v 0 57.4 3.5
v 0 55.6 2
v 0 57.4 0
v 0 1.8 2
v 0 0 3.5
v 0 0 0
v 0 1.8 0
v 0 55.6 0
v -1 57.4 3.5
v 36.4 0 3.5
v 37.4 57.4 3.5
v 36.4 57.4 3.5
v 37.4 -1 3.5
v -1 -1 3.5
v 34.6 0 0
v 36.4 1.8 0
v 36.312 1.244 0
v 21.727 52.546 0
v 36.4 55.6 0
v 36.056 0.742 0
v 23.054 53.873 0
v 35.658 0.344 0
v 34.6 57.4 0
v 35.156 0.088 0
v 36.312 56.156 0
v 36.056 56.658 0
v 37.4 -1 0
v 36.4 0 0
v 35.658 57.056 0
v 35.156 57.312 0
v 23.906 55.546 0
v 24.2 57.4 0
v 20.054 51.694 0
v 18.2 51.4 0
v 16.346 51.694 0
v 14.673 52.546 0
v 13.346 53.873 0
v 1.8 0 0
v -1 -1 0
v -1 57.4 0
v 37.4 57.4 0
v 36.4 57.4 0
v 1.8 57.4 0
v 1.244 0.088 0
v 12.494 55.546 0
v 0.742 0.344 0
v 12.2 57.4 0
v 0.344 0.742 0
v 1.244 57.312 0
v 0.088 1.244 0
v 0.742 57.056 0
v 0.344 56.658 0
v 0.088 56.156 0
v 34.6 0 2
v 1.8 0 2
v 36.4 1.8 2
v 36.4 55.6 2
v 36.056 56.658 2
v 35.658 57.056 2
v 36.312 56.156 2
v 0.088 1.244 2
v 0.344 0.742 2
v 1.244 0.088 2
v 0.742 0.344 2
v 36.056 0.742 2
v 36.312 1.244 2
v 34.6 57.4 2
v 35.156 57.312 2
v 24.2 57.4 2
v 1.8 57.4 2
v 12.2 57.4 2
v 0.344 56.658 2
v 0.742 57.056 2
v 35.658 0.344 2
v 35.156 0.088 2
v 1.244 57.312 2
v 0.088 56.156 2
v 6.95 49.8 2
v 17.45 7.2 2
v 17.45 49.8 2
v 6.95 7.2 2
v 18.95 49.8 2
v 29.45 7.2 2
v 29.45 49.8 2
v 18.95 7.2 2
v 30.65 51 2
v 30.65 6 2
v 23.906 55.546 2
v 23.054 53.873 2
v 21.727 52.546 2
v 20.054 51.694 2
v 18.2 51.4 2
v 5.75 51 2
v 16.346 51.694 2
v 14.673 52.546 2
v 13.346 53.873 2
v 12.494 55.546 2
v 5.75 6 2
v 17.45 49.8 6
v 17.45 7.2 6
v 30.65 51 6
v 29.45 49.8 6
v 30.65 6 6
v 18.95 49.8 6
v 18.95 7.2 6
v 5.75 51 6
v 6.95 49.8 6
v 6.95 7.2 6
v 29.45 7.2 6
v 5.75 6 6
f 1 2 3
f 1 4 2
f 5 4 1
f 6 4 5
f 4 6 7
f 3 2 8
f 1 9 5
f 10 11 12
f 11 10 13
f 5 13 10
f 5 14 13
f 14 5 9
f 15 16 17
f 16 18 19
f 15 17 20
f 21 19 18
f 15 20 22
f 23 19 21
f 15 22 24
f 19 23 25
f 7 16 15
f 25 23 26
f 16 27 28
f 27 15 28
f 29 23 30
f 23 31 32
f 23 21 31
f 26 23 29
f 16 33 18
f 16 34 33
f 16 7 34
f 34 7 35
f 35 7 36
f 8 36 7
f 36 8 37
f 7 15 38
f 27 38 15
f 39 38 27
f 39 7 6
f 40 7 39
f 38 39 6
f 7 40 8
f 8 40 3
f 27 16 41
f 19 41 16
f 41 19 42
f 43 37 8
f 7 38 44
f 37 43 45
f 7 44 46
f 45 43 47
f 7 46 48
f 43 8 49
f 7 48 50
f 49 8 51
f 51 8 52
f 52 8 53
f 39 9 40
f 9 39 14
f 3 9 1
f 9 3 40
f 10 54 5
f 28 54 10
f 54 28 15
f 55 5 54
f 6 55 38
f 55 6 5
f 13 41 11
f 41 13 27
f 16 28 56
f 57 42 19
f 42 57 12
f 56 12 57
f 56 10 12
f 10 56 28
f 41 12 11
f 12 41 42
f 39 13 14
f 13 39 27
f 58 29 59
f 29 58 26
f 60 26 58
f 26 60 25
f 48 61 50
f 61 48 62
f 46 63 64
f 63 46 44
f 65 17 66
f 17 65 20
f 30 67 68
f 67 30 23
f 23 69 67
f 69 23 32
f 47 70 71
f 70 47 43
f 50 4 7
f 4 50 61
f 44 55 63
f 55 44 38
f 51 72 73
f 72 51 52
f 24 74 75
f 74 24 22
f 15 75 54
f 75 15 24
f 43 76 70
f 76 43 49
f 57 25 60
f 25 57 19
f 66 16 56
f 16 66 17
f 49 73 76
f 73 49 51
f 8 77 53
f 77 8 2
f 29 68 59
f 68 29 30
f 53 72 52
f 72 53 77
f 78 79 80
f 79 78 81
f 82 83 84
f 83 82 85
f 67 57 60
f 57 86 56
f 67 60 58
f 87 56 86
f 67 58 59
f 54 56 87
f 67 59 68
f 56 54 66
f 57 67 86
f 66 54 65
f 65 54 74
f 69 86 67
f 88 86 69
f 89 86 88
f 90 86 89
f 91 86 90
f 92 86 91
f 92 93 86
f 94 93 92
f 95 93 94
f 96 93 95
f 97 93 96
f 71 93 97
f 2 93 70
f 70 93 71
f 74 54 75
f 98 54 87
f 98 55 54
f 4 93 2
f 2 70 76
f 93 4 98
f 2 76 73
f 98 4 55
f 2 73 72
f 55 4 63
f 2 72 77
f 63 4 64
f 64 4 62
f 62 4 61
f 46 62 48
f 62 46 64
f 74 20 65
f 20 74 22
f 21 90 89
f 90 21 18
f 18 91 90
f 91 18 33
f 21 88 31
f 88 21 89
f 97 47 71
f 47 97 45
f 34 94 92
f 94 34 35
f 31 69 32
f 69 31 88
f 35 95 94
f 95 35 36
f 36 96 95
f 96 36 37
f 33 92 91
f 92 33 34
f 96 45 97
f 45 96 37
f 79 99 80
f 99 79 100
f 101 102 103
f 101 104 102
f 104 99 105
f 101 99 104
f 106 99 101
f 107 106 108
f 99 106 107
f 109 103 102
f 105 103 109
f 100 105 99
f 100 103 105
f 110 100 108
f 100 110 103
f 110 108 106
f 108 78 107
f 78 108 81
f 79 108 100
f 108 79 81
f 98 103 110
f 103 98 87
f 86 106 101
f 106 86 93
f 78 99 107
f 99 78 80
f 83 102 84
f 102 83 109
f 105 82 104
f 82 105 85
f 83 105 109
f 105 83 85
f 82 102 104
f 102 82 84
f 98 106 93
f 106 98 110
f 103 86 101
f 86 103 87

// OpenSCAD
// Pocket Gambler — Battery Door
// Sliding door for 2× AAA battery compartment
// Fits into the battery_door opening in the rear lid

// ═══════════════════════════════════════════════════
// PARAMETERS (must match lid.scad opening)
// ═══════════════════════════════════════════════════

door_w    = 36.4;   // slightly smaller than opening (0.6mm clearance per side)
door_h    = 57.4;   // slightly smaller than opening
door_t    = 2.0;    // door plate thickness
corner_r  = 1.8;

// Lip around 3 edges (holds door in opening, open 4th side for sliding)
lip_t     = 1.0;    // lip thickness (overlaps lid edge)
lip_h     = 1.5;    // how much lip wraps around lid thickness

// Thumb notch (half-circle cutout for opening)
notch_r   = 6;
notch_x   = door_w / 2;
notch_y   = door_h;   // at the open (sliding) edge

// AAA cell guides (internal ribs to hold batteries in place)
// 2× AAA in parallel orientation (side by side)
aaa_d      = 10.5;   // AAA cell diameter + 0.5mm clearance
aaa_len    = 45.0;   // AAA cell length + 1mm clearance
aaa_wall   = 1.2;    // rib wall thickness
aaa_sep    = 1.5;    // gap between cells
aaa_y_off  = 6;      // from bottom of door interior

// Total cell bay width = 2 × aaa_d + aaa_sep + 2 × aaa_wall
// Must fit within door_w
bay_w  = 2 * aaa_d + aaa_sep + 2 * aaa_wall;
bay_x  = (door_w - bay_w) / 2;


// ═══════════════════════════════════════════════════
// MODULES
// ═══════════════════════════════════════════════════

module rounded_plate(w, h, t, r) {
    hull() {
        translate([r, r, 0])       cylinder(r=r, h=t, $fn=20);
        translate([w-r, r, 0])     cylinder(r=r, h=t, $fn=20);
        translate([r, h-r, 0])     cylinder(r=r, h=t, $fn=20);
        translate([w-r, h-r, 0])   cylinder(r=r, h=t, $fn=20);
    }
}

module thumb_notch() {
    translate([notch_x, notch_y, -0.1])
        cylinder(r=notch_r, h=door_t + 0.2, $fn=20);
}

module edge_lips() {
    // Left lip
    translate([-lip_t, 0, 0])
        cube([lip_t, door_h, door_t + lip_h]);
    // Right lip
    translate([door_w, 0, 0])
        cube([lip_t, door_h, door_t + lip_h]);
    // Bottom lip (closed end)
    translate([-lip_t, -lip_t, 0])
        cube([door_w + 2*lip_t, lip_t, door_t + lip_h]);
    // Note: top edge (notch end) has no lip — this is the sliding direction
}

module aaa_cell_guides() {
    // Two parallel cradles for AAA cells
    guide_h = 4;  // height of rib wall above door floor

    // Left outer wall
    translate([bay_x, aaa_y_off, door_t])
        cube([aaa_wall, aaa_len, guide_h]);

    // Center divider
    translate([bay_x + aaa_wall + aaa_d, aaa_y_off, door_t])
        cube([aaa_sep, aaa_len, guide_h]);

    // Right outer wall
    translate([bay_x + aaa_wall + aaa_d + aaa_sep + aaa_d, aaa_y_off, door_t])
        cube([aaa_wall, aaa_len, guide_h]);

    // End stops (short ribs at both ends of each cell bay)
    for (cell = [0:1]) {
        cx = bay_x + aaa_wall + cell * (aaa_d + aaa_sep);
        // Front end stop
        translate([cx, aaa_y_off, door_t])
            cube([aaa_d, aaa_wall, guide_h]);
        // Rear end stop
        translate([cx, aaa_y_off + aaa_len - aaa_wall, door_t])
            cube([aaa_d, aaa_wall, guide_h]);
    }
}


// ═══════════════════════════════════════════════════
// MAIN ASSEMBLY
// ═══════════════════════════════════════════════════

difference() {
    union() {
        rounded_plate(door_w, door_h, door_t, corner_r);
        edge_lips();
    }
    thumb_notch();
}

aaa_cell_guides();
